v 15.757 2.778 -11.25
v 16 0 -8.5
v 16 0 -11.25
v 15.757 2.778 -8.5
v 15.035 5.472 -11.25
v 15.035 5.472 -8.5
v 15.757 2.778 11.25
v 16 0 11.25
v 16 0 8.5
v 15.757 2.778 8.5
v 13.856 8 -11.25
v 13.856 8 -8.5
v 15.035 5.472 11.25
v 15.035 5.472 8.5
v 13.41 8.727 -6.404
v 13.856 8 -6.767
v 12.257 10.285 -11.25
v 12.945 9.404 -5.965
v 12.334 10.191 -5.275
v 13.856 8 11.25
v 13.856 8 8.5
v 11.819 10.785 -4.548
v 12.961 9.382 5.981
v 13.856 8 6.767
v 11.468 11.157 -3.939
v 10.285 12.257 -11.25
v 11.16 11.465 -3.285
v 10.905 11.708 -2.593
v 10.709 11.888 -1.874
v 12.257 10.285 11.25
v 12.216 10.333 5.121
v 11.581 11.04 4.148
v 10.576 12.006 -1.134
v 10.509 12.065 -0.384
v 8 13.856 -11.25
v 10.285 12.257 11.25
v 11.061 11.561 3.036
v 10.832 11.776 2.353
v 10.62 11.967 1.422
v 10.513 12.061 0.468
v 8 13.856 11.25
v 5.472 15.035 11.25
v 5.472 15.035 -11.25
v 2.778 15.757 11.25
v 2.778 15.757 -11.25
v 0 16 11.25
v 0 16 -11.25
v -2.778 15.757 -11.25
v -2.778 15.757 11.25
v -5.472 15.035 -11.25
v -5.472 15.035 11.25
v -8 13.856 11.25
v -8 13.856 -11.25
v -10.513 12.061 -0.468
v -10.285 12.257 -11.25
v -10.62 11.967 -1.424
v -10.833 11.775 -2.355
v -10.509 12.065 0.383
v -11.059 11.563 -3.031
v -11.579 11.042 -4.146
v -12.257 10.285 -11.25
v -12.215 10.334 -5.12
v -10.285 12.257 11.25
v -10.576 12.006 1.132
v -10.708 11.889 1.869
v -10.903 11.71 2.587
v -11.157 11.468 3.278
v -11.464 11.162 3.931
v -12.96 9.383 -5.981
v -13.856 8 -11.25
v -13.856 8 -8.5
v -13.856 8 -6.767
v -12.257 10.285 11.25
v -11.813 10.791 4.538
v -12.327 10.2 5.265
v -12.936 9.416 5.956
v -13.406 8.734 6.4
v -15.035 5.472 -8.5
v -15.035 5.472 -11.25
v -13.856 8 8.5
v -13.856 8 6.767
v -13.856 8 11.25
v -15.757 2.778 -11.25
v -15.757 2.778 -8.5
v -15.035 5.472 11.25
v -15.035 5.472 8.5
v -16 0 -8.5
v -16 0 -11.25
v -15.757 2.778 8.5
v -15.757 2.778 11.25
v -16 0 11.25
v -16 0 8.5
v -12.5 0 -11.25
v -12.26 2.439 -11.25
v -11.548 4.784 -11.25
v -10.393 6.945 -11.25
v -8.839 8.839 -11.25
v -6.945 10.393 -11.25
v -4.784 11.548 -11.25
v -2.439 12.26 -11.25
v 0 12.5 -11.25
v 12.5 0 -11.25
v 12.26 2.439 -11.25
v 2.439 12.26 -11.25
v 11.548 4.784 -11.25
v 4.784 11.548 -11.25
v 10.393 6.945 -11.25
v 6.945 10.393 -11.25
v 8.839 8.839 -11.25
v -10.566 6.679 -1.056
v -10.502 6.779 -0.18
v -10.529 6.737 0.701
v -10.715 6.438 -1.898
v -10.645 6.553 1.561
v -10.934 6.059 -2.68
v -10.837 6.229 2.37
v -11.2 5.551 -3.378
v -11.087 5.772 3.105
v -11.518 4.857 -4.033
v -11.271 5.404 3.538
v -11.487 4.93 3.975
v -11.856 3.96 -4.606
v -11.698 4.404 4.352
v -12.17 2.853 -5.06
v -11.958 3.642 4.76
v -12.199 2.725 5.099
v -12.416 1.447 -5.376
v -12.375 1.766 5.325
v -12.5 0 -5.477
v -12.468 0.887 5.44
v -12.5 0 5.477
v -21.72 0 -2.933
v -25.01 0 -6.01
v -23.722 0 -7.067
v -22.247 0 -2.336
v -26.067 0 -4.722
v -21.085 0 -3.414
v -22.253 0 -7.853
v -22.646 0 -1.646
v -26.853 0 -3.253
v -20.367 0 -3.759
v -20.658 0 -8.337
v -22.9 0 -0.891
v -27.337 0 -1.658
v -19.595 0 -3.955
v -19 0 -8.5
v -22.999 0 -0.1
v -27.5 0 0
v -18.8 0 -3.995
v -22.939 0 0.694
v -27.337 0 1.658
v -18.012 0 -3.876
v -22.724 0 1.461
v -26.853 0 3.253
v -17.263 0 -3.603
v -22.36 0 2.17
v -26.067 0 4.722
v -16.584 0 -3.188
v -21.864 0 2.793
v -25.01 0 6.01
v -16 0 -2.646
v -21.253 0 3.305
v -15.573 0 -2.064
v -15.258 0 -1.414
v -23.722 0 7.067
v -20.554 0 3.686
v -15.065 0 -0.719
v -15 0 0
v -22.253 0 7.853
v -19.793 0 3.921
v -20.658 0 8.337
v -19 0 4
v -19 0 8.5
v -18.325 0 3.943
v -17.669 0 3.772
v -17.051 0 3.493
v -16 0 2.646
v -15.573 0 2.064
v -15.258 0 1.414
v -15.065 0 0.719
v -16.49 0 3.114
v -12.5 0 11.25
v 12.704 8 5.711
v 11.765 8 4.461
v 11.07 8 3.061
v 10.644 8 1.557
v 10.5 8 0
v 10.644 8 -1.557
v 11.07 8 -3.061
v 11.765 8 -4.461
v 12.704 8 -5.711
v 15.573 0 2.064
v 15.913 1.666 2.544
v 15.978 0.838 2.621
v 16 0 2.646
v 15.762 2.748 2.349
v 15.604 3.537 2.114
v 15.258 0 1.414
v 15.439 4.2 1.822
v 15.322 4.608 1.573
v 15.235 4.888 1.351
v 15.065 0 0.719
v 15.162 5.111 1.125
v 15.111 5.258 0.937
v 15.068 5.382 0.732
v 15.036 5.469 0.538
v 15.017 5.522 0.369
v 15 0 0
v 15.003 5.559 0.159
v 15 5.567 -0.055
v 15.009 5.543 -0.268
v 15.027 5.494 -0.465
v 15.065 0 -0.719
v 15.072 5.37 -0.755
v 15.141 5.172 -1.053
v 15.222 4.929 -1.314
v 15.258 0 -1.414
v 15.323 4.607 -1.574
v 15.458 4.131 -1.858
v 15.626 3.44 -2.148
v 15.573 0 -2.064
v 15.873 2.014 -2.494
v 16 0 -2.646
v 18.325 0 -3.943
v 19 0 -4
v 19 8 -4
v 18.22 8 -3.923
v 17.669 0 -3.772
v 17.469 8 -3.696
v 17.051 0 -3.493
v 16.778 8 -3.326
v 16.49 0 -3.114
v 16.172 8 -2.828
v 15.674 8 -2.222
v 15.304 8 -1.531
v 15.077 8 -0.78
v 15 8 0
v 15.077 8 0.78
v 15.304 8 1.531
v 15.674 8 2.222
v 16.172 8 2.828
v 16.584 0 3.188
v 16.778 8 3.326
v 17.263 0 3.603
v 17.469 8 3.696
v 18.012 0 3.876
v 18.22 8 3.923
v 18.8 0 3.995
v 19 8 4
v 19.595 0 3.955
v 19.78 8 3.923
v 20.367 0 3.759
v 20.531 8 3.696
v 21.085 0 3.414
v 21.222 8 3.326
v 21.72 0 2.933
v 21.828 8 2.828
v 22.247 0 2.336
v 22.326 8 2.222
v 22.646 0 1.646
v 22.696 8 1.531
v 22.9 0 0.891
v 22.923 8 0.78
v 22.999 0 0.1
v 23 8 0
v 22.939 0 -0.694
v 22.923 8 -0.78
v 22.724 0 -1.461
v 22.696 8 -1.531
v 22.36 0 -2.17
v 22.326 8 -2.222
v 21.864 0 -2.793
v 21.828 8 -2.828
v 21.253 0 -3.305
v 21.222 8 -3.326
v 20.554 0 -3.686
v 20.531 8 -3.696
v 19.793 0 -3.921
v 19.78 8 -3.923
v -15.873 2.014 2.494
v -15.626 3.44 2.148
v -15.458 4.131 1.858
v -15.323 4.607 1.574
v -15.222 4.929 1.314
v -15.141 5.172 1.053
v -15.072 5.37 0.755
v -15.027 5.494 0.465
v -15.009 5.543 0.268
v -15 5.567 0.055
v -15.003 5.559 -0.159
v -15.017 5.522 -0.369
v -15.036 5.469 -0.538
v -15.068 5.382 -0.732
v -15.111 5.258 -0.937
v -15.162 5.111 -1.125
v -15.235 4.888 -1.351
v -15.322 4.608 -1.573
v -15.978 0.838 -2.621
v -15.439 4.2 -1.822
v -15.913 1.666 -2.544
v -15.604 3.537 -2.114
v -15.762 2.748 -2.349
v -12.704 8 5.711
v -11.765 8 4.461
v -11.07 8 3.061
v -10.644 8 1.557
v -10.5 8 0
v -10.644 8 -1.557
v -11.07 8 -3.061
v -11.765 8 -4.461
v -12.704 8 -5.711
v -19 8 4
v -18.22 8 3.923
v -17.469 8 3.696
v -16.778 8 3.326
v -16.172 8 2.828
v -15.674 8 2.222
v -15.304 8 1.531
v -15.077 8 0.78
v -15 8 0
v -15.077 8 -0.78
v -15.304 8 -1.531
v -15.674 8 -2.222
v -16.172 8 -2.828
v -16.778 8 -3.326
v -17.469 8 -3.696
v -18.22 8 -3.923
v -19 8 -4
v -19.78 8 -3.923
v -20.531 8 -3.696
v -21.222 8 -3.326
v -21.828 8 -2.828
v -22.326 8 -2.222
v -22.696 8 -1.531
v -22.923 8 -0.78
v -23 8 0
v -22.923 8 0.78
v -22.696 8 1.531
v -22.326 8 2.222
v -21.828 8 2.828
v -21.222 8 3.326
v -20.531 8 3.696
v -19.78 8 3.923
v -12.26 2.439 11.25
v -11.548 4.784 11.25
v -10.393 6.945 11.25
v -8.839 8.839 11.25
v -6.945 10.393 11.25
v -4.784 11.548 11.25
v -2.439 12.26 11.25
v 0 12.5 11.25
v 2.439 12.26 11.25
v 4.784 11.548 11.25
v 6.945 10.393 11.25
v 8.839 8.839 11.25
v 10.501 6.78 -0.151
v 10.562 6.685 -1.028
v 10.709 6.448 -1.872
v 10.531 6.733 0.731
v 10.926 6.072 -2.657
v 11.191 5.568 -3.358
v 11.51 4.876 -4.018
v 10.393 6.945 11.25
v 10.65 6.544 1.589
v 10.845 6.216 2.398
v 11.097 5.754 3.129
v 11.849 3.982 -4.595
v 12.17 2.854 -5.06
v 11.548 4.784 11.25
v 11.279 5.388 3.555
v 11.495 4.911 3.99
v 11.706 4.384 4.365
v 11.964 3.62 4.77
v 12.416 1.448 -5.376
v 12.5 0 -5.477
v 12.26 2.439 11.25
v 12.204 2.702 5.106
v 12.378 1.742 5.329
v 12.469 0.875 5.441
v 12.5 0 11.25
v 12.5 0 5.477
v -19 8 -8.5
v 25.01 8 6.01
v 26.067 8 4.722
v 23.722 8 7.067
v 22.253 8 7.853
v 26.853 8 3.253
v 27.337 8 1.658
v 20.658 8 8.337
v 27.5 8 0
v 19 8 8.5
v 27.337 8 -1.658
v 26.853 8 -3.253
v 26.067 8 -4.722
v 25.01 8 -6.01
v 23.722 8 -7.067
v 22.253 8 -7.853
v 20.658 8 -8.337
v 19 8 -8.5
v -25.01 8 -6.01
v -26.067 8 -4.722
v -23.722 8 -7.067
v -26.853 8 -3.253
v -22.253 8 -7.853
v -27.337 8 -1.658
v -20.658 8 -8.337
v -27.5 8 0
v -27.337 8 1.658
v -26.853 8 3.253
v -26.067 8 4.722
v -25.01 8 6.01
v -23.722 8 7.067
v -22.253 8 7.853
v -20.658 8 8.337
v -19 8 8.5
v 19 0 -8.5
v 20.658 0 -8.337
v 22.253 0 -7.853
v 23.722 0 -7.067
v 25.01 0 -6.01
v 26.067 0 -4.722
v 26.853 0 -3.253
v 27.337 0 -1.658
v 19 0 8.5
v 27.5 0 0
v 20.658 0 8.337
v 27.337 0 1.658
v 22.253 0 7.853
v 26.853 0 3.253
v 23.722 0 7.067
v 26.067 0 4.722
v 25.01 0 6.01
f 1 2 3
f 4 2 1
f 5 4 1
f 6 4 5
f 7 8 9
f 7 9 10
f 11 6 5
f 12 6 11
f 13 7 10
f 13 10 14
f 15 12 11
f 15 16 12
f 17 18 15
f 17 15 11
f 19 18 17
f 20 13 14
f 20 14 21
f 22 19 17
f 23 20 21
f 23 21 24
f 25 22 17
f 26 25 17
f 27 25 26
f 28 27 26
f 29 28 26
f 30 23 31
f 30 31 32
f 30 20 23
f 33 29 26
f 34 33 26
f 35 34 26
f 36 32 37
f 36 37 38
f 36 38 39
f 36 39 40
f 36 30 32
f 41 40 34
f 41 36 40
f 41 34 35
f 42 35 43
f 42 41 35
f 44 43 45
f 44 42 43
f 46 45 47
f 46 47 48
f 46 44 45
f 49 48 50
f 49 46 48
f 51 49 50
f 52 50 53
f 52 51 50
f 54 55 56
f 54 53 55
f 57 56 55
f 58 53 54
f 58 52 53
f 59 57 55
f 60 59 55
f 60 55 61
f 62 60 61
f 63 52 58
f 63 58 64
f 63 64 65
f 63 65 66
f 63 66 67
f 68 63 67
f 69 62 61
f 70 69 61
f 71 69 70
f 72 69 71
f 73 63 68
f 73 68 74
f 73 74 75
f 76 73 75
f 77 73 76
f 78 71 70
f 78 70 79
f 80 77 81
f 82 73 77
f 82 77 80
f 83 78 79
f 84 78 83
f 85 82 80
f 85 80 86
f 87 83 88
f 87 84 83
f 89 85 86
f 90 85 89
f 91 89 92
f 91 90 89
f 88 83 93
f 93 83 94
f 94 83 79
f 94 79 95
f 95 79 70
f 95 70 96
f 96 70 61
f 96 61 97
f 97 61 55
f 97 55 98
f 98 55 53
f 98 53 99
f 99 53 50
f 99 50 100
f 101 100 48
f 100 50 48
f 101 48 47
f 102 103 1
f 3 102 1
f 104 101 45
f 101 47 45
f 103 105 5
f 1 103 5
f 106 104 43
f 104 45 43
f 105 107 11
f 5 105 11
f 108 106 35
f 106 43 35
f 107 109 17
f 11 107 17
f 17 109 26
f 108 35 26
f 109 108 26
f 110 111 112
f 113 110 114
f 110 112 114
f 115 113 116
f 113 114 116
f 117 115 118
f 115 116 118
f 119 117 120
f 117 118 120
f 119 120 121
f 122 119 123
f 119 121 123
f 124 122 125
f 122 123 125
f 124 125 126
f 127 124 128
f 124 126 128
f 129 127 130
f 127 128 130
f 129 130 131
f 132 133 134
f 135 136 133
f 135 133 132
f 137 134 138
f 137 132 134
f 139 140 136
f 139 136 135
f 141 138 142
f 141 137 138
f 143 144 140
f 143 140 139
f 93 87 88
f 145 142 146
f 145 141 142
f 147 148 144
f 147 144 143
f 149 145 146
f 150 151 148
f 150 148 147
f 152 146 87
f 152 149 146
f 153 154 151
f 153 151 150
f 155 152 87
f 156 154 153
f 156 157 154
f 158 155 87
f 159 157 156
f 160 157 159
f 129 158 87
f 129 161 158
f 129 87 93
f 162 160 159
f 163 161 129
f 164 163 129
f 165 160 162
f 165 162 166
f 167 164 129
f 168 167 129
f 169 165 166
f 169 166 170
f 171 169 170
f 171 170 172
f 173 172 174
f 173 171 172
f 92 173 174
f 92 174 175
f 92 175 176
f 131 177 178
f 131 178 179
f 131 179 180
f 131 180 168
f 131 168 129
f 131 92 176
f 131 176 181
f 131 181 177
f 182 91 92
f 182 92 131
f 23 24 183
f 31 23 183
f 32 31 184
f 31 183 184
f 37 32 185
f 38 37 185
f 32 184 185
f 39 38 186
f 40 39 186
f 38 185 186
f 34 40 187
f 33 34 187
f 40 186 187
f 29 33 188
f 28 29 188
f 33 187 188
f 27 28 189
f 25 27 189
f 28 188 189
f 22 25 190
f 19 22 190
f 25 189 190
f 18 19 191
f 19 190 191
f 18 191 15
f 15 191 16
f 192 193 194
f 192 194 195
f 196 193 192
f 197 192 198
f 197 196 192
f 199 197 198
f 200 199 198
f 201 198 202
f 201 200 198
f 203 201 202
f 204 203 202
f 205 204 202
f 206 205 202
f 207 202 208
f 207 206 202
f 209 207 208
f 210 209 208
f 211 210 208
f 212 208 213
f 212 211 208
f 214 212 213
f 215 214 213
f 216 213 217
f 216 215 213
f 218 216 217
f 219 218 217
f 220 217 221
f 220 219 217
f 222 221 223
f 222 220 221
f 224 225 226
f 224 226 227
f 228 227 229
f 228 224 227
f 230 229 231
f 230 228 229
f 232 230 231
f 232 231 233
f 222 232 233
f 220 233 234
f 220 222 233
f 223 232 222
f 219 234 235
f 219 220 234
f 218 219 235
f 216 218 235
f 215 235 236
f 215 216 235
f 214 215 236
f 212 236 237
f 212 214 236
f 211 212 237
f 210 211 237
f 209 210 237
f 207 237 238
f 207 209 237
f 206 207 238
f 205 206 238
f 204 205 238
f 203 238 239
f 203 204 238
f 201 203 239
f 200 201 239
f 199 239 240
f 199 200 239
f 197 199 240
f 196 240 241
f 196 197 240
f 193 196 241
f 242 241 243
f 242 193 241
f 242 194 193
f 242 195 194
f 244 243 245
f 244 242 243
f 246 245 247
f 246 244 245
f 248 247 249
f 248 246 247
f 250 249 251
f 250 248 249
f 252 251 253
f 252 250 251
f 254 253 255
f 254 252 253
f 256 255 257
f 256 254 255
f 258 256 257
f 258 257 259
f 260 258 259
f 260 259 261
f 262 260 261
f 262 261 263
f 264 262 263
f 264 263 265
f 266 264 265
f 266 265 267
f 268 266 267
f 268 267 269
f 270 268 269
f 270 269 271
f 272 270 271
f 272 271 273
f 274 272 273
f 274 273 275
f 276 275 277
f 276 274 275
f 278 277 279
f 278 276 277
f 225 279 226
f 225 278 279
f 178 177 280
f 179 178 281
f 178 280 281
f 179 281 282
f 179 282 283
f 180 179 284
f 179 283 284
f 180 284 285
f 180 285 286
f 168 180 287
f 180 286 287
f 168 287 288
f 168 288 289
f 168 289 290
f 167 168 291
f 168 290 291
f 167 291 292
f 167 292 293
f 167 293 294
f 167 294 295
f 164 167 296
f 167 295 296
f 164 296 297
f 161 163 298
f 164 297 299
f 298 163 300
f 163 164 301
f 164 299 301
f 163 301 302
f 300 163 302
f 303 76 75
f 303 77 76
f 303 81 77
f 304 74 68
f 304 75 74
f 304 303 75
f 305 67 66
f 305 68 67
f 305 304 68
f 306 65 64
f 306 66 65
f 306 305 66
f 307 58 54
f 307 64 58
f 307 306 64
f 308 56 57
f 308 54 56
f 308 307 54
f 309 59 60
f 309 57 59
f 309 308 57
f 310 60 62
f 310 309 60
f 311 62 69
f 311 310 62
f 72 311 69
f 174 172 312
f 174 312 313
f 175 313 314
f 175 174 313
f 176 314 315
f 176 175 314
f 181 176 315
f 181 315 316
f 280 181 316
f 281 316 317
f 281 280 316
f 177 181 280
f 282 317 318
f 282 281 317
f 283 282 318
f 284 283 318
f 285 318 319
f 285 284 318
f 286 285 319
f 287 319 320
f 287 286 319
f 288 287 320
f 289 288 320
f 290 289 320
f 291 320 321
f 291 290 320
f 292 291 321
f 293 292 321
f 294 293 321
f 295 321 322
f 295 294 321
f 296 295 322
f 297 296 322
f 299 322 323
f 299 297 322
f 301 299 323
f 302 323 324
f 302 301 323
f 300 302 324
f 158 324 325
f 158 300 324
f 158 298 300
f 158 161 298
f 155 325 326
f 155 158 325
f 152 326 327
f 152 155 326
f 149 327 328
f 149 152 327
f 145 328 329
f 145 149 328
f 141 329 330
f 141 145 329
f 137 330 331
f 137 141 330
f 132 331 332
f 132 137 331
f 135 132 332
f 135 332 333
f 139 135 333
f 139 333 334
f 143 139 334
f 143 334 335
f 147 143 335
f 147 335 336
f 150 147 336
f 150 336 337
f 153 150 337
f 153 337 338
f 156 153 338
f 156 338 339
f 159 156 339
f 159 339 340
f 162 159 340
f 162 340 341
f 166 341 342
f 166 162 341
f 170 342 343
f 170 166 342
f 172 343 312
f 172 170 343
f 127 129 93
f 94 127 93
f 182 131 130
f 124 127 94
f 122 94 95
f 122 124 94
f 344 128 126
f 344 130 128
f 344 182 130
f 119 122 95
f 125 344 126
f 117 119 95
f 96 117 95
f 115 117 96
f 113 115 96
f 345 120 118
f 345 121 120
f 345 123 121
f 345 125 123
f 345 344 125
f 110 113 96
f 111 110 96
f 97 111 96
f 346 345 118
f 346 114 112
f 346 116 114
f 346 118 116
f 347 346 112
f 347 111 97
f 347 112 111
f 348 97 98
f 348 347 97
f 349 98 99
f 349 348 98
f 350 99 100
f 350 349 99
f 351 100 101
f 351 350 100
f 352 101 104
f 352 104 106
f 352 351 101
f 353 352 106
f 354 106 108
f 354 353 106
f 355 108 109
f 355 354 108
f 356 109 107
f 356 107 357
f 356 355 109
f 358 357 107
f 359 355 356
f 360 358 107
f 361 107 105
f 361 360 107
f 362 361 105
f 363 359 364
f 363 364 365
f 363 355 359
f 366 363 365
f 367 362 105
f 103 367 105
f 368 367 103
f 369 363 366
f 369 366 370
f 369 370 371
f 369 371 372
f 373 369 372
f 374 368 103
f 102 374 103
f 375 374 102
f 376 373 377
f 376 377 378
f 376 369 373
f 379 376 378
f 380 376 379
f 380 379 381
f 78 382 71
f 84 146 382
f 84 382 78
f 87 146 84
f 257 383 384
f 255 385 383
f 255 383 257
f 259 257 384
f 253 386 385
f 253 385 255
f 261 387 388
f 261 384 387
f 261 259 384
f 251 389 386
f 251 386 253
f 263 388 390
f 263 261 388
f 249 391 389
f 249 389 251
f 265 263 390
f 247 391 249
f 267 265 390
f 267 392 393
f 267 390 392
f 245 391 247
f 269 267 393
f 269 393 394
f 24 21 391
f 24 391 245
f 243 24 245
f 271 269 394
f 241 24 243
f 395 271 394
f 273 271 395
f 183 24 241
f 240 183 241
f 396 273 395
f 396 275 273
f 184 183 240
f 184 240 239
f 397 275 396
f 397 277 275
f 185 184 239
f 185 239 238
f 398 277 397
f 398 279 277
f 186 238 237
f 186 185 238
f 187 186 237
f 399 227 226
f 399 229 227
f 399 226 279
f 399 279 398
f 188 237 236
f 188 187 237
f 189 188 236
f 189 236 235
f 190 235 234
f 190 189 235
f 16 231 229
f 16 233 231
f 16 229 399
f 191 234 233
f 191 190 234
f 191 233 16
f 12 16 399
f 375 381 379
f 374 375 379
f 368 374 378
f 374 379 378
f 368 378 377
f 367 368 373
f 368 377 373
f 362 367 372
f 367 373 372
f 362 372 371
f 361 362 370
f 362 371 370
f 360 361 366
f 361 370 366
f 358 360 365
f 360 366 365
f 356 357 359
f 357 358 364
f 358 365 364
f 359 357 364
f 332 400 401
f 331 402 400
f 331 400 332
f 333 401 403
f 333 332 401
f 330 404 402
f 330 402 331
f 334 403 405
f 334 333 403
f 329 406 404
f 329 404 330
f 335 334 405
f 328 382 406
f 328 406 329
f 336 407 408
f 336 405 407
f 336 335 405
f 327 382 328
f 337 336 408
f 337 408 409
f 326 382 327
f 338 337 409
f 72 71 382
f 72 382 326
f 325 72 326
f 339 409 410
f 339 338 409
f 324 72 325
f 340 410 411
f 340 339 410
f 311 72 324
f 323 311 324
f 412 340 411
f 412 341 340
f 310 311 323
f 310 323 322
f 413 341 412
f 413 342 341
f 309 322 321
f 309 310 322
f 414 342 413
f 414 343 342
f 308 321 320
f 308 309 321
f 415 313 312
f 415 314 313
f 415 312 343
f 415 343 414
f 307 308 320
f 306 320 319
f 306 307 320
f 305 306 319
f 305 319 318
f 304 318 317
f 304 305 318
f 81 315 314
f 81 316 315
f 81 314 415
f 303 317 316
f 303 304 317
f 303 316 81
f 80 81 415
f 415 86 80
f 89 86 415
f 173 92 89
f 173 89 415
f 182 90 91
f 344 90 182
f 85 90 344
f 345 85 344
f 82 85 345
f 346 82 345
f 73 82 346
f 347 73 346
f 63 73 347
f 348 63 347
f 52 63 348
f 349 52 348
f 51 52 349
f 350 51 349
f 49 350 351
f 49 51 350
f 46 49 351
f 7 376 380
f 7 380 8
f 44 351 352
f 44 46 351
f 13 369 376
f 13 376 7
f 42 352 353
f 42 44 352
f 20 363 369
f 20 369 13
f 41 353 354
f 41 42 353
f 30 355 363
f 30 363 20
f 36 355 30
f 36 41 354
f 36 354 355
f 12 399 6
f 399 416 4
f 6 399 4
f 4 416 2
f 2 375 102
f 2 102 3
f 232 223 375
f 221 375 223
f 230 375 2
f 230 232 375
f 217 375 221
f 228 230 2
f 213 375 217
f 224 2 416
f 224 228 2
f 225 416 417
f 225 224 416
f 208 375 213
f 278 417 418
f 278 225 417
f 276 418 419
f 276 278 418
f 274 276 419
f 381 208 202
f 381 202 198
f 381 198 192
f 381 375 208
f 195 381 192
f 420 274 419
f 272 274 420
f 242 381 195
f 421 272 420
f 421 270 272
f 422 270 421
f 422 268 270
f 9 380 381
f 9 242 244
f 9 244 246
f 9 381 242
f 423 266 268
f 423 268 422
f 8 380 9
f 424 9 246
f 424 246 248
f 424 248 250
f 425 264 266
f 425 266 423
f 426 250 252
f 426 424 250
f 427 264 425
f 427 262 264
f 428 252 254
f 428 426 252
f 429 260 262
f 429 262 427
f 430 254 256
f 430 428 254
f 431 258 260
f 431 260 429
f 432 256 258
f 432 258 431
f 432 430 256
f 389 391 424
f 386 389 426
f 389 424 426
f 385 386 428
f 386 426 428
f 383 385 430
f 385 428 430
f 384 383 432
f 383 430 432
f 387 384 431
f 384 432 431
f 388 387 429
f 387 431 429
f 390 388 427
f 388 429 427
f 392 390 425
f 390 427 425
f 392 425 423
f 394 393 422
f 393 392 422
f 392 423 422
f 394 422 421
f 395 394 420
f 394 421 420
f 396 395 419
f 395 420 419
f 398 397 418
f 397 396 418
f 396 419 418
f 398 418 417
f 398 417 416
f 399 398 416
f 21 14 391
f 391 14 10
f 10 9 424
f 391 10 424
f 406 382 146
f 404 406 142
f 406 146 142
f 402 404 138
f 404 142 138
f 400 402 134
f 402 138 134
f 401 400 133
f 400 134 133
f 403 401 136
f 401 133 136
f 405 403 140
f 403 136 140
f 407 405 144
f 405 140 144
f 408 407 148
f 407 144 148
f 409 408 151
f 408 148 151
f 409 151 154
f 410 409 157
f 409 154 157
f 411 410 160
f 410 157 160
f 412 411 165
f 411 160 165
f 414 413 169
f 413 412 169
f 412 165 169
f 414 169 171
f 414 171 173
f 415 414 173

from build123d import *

# Parameters (mm, degrees)
SKETCH_4_R          = 8.5
SKETCH_4_R_2        = 4
EXTRUDE_1_DEPTH     = 8
EXTRUDE_1_2_DEPTH   = 8
SKETCH_5_R          = 12.5
CUT_EXTRUDE_1_DEPTH = 10
EXTRUDE_3_DEPTH     = 11.25
SKETCH_7_R          = 8.5
CUT_EXTRUDE_2_DEPTH = 31.770318642
EXTRUDE_START       = -8
EXTRUDE_4_DEPTH     = 8
SKETCH_9_R          = 4
CUT_EXTRUDE_3_DEPTH = 31.770318642


with BuildPart() as part:
    # 草图4 → 凸台-拉伸1 (new body)
    with BuildSketch(Plane(origin=(0, 0, 0), x_dir=(1, 0, 0), z_dir=(0, 1, 0))):
        with Locations(Location((-19, 0, 0), (0, 0, 270))):
            Circle(SKETCH_4_R)
        with Locations(Location((-19, 0, 0), (0, 0, 270))):
            Circle(SKETCH_4_R_2, mode=Mode.SUBTRACT)
    extrude(amount=EXTRUDE_1_DEPTH)


with BuildPart() as body_2:
    # 草图4 → Extrude 1 2 (new body)
    with BuildSketch(Plane(origin=(0, 0, 0), x_dir=(1, 0, 0), z_dir=(0, 1, 0))):
        with Locations(Location((19, 0, 0), (0, 0, 90))):
            Circle(SKETCH_4_R)
        with Locations(Location((19, 0, 0), (0, 0, 90))):
            Circle(SKETCH_4_R_2, mode=Mode.SUBTRACT)
    extrude(amount=EXTRUDE_1_2_DEPTH)


with BuildPart() as cut_extrude_1_tool:
    # 草图5 → 切除-拉伸1 (new, symmetric)
    with BuildSketch(Plane.XY):
        Circle(SKETCH_5_R)
    extrude(amount=CUT_EXTRUDE_1_DEPTH, both=True)


with BuildPart() as part_1:
    add(part.part)

    # 切除-拉伸1: cut by cut_extrude_1_tool
    add(cut_extrude_1_tool.part, mode=Mode.SUBTRACT)



with BuildPart() as body_2_1:
    add(body_2.part)

    # 切除-拉伸1: cut by cut_extrude_1_tool
    add(cut_extrude_1_tool.part, mode=Mode.SUBTRACT)


with BuildPart() as part_2:
    add(part_1.part)

    add(body_2_1.part)  # 凸台-拉伸3 merges body 2
    # 草图6 → 凸台-拉伸3 (add, symmetric)
    with BuildSketch(Plane.XY):
        with BuildLine():
            Line((-16, 0), (-12.5, 0))
            ThreePointArc((-12.5, 0), (0, 12.5), (12.5, 0))
            Line((12.5, 0), (16, 0))
            ThreePointArc((16, 0), (0, 16), (-16, 0))
        make_face()
    extrude(amount=EXTRUDE_3_DEPTH, both=True)

    # 草图7 → 切除-拉伸2 (cut, through all)
    with BuildSketch(Plane(origin=(0, 8, 0), x_dir=(1, 0, 0), z_dir=(0, 1, 0))):
        with Locations((-19, 0)):
            Circle(SKETCH_7_R)
    cut_extrude_2 = extrude(amount=CUT_EXTRUDE_2_DEPTH, mode=Mode.SUBTRACT)

    # 草图8 → 凸台-拉伸4 (add)
    with BuildSketch(Plane(origin=(0, 8, 0), x_dir=(1, 0, 0), z_dir=(0, 1, 0)).offset(EXTRUDE_START)):
        with BuildLine():
            Line((-19, -8.5), (-19, -4))
            ThreePointArc((-19, -4), (-15, 0), (-19, 4))
            Line((-19, 4), (-19, 8.5))
            Line((-19, 8.5), (-13.461758669, 8.5))
            Line((-13.461758669, 8.5), (-13.461758669, -8.5))
            Line((-13.461758669, -8.5), (-19, -8.5))
        make_face()
    extrude_4 = extrude(amount=EXTRUDE_4_DEPTH)

    # 草图9 → 切除-拉伸3 (cut, through all)
    with BuildSketch(Plane(origin=(0, 8, 0), x_dir=(1, 0, 0), z_dir=(0, 1, 0))):
        with Locations(Location((-19, 0, 0), (0, 0, 270))):
            Circle(SKETCH_9_R)
    cut_extrude_3 = extrude(amount=-CUT_EXTRUDE_3_DEPTH, mode=Mode.SUBTRACT)

    # 镜向1: 切除-拉伸2, 凸台-拉伸4, 切除-拉伸3 across plane
    add(cut_extrude_2.mirror(Plane(origin=(0, 0, 0), x_dir=(0, 0, 1), z_dir=(1, 0, 0))), mode=Mode.SUBTRACT)
    add(extrude_4.mirror(Plane(origin=(0, 0, 0), x_dir=(0, 0, 1), z_dir=(1, 0, 0))))
    add(cut_extrude_3.mirror(Plane(origin=(0, 0, 0), x_dir=(0, 0, 1), z_dir=(1, 0, 0))), mode=Mode.SUBTRACT)


solid = part_2.part
